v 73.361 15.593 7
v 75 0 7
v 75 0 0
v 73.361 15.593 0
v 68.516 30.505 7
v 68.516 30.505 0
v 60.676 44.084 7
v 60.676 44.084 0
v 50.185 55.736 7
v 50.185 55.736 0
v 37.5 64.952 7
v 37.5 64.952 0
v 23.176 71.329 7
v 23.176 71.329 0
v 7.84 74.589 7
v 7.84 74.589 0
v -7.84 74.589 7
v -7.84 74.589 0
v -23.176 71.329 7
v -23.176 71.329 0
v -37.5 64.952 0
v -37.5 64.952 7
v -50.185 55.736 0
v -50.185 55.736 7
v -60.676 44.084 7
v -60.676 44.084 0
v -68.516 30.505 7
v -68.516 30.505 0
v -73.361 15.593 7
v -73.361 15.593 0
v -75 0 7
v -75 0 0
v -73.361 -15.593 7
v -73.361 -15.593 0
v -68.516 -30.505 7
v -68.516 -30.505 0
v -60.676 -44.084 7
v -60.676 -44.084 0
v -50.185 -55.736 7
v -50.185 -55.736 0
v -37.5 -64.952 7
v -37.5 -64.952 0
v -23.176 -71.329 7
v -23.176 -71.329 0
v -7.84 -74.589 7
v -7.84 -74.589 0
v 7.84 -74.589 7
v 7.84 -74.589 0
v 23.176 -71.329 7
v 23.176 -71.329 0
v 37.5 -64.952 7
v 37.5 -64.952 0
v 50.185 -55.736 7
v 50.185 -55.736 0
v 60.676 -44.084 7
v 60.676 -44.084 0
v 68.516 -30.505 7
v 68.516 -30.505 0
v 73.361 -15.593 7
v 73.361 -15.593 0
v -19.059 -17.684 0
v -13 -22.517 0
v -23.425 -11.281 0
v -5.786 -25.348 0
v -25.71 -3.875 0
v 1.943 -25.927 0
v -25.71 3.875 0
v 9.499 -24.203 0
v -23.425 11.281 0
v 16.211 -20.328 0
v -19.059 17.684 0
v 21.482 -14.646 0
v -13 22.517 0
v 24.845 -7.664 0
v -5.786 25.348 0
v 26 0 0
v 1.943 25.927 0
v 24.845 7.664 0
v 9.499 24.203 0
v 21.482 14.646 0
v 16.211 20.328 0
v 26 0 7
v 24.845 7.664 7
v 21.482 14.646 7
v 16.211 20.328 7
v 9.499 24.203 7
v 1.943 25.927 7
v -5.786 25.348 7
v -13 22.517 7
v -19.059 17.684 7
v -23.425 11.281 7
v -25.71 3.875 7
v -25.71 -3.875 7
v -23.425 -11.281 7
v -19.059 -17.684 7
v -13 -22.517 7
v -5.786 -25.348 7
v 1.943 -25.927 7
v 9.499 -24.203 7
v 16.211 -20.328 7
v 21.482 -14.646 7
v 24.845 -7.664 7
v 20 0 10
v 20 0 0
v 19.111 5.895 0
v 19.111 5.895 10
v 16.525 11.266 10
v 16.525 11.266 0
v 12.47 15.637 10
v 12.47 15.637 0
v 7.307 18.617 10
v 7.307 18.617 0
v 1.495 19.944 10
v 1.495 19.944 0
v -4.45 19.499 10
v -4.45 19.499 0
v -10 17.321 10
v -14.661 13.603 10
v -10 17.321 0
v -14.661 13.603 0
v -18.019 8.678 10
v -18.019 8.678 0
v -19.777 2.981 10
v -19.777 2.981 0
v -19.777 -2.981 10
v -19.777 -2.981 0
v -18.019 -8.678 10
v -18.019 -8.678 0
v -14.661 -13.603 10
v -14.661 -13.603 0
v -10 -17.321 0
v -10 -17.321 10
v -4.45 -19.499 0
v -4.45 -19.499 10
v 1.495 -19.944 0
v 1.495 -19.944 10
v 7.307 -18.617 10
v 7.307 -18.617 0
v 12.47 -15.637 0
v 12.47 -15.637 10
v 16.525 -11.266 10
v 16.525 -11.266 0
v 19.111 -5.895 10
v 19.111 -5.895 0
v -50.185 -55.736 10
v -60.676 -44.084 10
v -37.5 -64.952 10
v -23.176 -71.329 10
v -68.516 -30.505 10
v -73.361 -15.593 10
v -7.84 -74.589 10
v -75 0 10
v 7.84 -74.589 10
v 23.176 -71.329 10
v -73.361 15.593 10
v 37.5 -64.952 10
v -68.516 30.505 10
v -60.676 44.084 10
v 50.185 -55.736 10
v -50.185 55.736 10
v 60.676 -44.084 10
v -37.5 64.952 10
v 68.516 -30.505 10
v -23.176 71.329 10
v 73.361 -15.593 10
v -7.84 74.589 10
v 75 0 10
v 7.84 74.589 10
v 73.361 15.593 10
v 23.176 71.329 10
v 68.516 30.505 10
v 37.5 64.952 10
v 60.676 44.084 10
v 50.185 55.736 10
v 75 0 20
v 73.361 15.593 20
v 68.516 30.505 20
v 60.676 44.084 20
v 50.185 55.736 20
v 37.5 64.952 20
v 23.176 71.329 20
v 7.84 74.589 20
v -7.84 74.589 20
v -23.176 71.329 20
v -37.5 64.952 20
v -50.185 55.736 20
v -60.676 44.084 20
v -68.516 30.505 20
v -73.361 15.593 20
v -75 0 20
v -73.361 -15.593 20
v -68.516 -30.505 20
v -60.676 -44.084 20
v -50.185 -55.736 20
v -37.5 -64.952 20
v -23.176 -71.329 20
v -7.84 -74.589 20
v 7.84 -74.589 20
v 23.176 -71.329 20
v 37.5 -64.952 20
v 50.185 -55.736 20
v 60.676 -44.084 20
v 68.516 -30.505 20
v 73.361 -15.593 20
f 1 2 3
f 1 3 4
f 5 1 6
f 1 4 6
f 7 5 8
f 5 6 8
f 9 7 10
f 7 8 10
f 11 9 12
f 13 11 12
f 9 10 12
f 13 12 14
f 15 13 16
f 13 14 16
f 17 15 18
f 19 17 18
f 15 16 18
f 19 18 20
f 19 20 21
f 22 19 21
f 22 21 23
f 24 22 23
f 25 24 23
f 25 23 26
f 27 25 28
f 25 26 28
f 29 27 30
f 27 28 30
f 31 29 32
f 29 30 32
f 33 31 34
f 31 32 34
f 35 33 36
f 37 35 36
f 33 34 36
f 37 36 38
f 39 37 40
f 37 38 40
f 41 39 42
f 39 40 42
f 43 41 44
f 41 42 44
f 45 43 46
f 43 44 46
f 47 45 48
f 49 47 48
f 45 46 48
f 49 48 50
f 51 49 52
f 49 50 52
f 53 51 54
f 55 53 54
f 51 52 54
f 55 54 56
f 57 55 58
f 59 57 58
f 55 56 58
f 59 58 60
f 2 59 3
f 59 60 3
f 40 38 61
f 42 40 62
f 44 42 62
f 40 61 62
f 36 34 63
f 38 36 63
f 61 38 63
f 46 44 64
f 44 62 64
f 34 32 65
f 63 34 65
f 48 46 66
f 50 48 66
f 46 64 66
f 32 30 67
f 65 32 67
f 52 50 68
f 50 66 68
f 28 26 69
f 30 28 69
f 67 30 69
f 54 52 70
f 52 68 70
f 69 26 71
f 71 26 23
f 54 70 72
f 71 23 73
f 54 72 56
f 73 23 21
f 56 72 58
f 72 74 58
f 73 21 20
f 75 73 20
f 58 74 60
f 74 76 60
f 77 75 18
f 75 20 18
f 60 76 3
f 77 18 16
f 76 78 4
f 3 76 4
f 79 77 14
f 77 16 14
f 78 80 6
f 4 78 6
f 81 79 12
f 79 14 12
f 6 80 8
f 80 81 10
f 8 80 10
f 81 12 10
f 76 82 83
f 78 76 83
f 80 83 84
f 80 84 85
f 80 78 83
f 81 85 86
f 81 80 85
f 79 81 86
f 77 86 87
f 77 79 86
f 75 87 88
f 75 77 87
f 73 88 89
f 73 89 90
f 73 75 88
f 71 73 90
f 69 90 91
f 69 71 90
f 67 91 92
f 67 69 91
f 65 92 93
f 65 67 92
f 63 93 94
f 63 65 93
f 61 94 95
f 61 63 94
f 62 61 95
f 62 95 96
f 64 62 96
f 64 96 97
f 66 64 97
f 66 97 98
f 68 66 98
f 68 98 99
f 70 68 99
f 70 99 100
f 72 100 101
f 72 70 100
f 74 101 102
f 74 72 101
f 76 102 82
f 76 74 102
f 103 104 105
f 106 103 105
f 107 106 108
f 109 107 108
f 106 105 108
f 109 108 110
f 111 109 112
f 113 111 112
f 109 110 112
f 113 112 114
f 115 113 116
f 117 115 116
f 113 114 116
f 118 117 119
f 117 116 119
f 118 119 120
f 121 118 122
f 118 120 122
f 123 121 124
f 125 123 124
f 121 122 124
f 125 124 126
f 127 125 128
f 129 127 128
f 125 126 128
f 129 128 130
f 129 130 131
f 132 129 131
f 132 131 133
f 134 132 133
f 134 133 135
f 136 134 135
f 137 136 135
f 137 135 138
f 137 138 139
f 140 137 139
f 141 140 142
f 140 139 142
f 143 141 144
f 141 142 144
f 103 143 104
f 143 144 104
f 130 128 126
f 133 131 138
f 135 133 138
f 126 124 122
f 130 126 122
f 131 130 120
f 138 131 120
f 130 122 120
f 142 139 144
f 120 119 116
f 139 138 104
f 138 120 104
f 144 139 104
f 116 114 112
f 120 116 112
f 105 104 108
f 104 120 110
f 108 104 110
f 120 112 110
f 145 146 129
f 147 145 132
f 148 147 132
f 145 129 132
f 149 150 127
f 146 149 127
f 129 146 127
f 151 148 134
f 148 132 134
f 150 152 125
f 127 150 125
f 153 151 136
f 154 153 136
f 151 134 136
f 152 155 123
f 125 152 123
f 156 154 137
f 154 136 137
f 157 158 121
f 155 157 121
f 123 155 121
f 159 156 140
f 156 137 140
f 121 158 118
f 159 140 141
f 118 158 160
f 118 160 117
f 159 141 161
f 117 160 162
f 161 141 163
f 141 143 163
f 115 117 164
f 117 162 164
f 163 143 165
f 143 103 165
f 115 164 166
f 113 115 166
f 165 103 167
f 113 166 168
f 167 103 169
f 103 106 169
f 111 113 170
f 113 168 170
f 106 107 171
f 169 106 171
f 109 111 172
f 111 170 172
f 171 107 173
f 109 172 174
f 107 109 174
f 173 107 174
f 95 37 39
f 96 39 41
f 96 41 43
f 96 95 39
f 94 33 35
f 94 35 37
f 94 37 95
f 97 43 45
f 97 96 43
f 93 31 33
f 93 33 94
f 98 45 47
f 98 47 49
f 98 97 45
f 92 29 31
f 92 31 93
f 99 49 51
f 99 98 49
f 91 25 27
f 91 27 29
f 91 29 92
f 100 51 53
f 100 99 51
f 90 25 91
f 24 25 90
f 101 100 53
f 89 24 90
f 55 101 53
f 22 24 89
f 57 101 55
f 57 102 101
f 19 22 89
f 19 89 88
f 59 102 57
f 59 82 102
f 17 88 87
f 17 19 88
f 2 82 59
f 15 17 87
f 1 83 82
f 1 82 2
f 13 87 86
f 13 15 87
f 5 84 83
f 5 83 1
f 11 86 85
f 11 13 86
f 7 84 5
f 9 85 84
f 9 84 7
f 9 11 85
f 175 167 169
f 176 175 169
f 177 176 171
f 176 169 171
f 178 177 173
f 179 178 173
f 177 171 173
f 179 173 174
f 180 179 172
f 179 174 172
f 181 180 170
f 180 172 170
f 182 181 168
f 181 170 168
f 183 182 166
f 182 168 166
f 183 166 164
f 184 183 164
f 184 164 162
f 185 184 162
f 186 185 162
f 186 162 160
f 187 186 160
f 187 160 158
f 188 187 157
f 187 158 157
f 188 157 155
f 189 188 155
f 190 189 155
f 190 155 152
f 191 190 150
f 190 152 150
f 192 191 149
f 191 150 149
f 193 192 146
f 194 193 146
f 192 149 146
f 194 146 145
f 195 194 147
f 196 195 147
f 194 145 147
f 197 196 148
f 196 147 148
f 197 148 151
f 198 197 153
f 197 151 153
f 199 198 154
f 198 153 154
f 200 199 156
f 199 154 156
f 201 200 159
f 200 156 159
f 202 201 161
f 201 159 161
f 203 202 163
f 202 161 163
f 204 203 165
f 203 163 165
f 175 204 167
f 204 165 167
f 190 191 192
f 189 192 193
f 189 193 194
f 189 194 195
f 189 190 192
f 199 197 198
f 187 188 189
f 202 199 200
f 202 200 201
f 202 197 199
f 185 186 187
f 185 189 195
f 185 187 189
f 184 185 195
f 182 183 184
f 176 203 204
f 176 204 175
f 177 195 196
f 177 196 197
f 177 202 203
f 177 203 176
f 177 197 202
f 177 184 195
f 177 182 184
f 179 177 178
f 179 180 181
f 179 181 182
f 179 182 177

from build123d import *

# Parameters (mm, degrees)
F0_R     = 75
F0_R_2   = 26
F1_DEPTH = 7
F2_R     = 20
F3_DEPTH = 10
F4_R     = 75
F4_R_2   = 20
F5_DEPTH = 10


with BuildPart() as f1:
    # F0 (on Top) → F1 (new body)
    with BuildSketch(Plane.XY):
        Circle(F0_R)
        Circle(F0_R_2, mode=Mode.SUBTRACT)
    extrude(amount=F1_DEPTH)


with BuildPart() as f3:
    # F2 (on Top) → F3 (new body)
    with BuildSketch(Plane.XY):
        Circle(F2_R)
    extrude(amount=F3_DEPTH)

    # F4 (on face) → F5 (join)
    with BuildSketch(Plane.XY.offset(10)):
        Circle(F4_R)
        Circle(F4_R_2, mode=Mode.SUBTRACT)
        Circle(F4_R_2)
    extrude(amount=F5_DEPTH)


solid = Compound([f1.part, f3.part])
